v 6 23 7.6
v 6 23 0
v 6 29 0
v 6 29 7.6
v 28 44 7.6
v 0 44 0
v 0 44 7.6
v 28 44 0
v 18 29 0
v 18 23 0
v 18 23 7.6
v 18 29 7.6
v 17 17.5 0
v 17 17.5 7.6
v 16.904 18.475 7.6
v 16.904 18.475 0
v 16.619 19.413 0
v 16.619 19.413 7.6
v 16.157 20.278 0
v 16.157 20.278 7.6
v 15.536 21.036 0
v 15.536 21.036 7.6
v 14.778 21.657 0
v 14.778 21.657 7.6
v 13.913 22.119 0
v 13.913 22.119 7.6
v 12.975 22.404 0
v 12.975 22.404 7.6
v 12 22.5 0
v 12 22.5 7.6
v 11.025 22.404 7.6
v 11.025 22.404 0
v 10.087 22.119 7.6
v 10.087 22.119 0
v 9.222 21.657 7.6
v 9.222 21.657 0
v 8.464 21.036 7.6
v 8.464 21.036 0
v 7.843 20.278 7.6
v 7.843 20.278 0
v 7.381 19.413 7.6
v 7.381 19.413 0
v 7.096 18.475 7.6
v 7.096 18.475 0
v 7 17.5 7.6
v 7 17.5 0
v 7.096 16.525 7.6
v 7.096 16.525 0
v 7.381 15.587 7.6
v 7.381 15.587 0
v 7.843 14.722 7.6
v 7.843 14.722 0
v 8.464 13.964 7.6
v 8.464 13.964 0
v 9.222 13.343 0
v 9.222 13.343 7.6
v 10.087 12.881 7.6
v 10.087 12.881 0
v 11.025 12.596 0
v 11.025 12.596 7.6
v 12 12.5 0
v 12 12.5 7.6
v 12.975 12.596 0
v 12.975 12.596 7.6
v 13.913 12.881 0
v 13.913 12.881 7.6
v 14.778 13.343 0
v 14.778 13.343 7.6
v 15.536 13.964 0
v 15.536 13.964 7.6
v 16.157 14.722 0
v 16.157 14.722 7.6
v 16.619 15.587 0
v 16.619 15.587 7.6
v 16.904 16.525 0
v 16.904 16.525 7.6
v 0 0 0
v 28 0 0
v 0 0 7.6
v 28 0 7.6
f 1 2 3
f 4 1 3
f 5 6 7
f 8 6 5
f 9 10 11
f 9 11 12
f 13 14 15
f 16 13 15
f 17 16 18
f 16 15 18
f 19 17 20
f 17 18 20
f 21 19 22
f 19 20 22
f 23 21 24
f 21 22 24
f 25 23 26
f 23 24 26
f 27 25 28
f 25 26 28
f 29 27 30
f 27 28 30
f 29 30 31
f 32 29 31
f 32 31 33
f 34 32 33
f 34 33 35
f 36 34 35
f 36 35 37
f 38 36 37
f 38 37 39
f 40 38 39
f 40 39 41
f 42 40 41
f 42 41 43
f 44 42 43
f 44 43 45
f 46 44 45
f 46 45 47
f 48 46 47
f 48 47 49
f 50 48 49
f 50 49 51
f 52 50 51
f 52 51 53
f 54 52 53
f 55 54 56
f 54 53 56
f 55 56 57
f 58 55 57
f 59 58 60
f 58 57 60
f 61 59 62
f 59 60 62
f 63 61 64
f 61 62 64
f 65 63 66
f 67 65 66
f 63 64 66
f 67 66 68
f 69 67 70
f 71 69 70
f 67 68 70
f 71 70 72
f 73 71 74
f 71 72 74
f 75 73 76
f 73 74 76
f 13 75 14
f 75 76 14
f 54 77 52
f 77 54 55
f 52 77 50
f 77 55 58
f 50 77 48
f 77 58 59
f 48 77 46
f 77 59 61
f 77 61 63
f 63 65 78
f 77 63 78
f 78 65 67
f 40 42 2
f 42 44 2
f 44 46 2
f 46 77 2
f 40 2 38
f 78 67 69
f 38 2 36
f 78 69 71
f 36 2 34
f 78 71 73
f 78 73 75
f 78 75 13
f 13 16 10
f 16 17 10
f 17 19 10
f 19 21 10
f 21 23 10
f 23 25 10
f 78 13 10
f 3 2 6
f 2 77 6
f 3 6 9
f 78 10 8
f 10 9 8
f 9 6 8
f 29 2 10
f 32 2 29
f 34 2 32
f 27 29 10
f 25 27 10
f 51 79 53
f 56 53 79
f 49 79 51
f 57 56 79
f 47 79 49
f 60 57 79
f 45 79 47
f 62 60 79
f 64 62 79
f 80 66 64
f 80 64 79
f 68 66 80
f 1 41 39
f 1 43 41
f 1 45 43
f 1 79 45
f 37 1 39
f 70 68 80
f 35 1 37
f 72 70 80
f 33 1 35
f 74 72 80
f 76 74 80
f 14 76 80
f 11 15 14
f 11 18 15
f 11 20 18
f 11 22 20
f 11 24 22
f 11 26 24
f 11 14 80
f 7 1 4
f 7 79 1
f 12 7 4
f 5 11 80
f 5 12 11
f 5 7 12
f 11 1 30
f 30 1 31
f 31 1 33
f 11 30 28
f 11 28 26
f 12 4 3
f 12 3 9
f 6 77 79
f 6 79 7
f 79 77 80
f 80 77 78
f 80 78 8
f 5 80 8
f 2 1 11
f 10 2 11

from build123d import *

# Parameters (mm, degrees)
F0_W     = 28
F0_H     = 44
F1_DEPTH = 7.6
F2_R     = 5
F2_W     = 12
F2_H     = 6
F3_DEPTH = 7.601


with BuildPart() as f1:
    # F0 (on Top) → F1 (new body)
    with BuildSketch(Plane.XY):
        with Locations((14, 22)):
            Rectangle(F0_W, F0_H)
    extrude(amount=F1_DEPTH)

    # F2 (on face) → F3 (cut, through all)
    with BuildSketch(Plane.XY.offset(7.6)):
        with Locations((12, 17.5)):
            Circle(F2_R)
        with Locations((12, 26)):
            Rectangle(F2_W, F2_H)
    extrude(amount=-F3_DEPTH, mode=Mode.SUBTRACT)


solid = f1.part
